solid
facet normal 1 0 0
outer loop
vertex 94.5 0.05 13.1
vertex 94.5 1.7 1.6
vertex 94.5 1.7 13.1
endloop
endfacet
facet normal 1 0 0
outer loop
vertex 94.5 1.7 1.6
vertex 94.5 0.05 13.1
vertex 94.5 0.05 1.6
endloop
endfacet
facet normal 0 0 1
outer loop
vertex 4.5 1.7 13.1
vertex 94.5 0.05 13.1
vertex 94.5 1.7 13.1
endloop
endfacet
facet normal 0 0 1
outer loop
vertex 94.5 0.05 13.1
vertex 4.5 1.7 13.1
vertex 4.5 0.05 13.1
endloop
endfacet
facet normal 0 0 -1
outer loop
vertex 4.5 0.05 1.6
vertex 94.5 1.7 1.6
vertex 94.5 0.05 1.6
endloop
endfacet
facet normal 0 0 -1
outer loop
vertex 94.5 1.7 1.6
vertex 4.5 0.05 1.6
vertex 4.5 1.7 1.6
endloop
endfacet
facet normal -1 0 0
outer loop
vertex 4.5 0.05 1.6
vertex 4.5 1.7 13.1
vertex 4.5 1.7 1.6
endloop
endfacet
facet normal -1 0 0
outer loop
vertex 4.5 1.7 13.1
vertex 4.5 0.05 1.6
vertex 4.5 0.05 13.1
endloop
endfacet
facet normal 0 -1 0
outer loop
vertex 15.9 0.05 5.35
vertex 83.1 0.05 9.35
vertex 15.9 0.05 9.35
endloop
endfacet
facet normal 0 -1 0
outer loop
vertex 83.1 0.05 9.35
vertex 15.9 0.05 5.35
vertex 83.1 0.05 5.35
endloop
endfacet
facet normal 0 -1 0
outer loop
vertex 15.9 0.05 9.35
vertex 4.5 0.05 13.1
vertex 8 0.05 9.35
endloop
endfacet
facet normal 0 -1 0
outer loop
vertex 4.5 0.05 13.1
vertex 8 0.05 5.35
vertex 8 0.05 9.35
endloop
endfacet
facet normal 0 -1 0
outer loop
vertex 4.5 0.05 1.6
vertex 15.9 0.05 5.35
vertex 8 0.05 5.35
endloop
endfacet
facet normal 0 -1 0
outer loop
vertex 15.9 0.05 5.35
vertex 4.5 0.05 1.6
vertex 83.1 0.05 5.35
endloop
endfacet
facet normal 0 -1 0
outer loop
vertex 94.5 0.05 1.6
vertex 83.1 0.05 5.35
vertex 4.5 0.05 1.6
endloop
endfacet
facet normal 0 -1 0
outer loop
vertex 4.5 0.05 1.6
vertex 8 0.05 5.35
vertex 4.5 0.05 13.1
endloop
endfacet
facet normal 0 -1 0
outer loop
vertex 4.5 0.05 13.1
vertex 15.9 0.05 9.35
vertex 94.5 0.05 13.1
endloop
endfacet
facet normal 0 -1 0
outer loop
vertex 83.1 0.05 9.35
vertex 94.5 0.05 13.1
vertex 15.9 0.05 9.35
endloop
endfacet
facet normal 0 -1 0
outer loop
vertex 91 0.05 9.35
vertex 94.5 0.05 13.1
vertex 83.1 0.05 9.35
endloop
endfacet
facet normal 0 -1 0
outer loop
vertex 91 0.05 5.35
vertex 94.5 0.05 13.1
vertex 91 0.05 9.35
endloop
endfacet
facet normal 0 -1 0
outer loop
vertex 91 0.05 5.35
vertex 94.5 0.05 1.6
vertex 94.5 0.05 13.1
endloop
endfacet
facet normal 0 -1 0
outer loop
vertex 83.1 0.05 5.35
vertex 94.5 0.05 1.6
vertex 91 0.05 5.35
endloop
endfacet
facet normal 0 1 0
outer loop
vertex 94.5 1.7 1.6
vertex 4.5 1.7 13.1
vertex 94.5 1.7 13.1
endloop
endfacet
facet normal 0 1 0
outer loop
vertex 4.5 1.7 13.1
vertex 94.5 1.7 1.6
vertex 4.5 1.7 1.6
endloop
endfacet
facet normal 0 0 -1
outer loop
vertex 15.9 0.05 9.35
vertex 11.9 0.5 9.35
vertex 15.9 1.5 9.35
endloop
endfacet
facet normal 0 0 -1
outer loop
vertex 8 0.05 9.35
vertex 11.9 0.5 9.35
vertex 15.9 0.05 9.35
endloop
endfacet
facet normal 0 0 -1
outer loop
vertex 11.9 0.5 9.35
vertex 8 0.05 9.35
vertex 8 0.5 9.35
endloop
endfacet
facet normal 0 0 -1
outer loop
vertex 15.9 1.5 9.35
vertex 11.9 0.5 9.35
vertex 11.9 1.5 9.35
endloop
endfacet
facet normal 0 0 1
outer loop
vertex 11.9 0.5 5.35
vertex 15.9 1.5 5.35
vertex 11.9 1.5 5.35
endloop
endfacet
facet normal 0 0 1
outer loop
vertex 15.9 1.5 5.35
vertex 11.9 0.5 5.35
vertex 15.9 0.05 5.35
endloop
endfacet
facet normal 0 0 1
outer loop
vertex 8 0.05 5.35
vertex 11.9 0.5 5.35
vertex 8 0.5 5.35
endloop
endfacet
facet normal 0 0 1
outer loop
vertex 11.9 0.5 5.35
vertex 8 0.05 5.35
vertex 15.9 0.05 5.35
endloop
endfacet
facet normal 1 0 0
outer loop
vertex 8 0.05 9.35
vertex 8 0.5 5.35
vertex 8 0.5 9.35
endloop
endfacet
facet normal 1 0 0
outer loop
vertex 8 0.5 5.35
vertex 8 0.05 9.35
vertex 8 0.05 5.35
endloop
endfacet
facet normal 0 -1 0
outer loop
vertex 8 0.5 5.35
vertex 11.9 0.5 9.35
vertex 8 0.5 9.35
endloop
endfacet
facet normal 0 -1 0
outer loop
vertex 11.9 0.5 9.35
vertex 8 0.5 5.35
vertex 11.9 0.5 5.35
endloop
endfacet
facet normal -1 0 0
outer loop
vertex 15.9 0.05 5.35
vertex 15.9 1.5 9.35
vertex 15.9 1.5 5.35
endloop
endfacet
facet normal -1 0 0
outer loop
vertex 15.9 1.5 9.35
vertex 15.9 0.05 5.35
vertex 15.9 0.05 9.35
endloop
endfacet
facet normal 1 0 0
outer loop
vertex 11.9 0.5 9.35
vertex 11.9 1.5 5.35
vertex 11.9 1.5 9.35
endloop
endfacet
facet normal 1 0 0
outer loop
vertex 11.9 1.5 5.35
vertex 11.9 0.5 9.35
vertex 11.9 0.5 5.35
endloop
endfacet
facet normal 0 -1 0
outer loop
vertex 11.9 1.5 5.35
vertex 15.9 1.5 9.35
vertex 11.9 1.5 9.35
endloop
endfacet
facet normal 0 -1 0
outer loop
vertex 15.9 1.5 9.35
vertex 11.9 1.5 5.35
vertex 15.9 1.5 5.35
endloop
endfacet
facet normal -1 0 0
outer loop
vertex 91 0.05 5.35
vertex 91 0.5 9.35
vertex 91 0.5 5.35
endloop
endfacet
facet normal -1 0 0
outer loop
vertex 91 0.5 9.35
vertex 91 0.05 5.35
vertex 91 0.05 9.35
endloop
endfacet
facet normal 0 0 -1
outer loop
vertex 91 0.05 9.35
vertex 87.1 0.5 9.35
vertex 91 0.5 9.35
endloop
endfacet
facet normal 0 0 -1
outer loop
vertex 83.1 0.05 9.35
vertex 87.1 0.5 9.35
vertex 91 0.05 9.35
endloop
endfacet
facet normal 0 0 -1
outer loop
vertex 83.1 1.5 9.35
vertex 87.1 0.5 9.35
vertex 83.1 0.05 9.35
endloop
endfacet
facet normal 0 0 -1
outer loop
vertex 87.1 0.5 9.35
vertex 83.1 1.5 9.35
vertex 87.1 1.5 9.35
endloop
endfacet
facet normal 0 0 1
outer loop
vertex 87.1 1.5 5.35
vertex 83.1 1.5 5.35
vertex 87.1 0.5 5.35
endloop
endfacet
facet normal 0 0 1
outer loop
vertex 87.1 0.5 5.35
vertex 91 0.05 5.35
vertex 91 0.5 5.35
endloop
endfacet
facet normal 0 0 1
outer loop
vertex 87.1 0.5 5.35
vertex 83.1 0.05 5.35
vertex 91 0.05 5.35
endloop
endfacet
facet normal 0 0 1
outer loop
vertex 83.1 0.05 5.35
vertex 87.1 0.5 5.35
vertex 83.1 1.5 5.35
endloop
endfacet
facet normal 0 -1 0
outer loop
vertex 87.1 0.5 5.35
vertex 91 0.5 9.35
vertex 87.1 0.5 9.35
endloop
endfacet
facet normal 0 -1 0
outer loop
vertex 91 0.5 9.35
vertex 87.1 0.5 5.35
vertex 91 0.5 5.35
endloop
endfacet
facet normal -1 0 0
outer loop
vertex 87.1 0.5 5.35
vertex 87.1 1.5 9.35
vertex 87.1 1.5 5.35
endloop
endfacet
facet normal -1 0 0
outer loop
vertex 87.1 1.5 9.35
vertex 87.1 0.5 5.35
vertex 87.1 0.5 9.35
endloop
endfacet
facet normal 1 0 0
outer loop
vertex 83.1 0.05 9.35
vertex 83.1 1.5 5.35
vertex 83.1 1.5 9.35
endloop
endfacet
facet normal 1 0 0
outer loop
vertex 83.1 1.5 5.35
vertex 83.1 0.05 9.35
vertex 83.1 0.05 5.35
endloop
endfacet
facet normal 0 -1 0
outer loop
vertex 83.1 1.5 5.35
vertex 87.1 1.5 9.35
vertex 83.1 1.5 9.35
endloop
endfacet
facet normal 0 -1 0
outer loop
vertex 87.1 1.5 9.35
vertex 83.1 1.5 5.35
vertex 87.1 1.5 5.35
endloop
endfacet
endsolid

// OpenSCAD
////// MixTape 3d Printed Case///////////////////////////

// 

plugHeight = 10.6; // [6:10]
tapeHeight = 11.5; //
topThickness = 1.6; 

bottom_wall_thickness = 2;

usb_charger = false;
cutout_aux_ports = false;

//rotate([55,0,$t*380]) translate([-50,0,0]){
rotate([0,0,0]) translate([0,0,0]){
//PCB();
//parts();

difference(){
    
    union(){
        tapeBody();
        //tapeTop();
    }
    
    // Plugs 
    translate([2.5,50,tapeHeight-plugHeight+topThickness]) cube([13,20,plugHeight+1],false); 
    translate([83.5,50,tapeHeight-plugHeight+topThickness]) cube([13,20,plugHeight+1],false);
    
    // write protectors 
    translate([10,0,0.5*tapeHeight+1.6]) cube([4,1,4],true);
    translate([13.9,0,0.5*tapeHeight+1.6]) cube([4,3,4],true);
    translate([89,0,0.5*tapeHeight+1.6]) cube([4,1,4],true);
    translate([85.1,0,0.5*tapeHeight+1.6]) cube([4,3,4],true);

    // Power signs
    //if (!usb_charger) {
    //    translate([41,0,0.5*tapeHeight+1.6]) cube([4,1.5,1],true);
    //    translate([41,0,0.5*tapeHeight+1.6]) cube([1,1.5,4],true);
    
    //    translate([58,0,0.5*tapeHeight+1.6]) cube([4,1.5,1],true); 
    //}
}
}

module FullCase(){
    tapeBody();
    tapeTop();
}


// Modules ///////////////////////////////

module PCB(){
color("DarkKhaki") 
translate ([0,0,tapeHeight+1.6]) linear_extrude(height = 1.6, center = false, convexity = 10, twist = 0) import("mixtape_case_3D_bottom.dxf", convexity=3);
color("Gold") 
translate ([0,0,tapeHeight+3.2]) linear_extrude(height = 0.2, center = false, convexity = 10, twist = 0) import("mixtape_case_3D_PCB.dxf", convexity=3);

color("DarkKhaki") 
translate ([0,0,tapeHeight+2*topThickness]) linear_extrude(height = 1.6, center = false, convexity = 10, twist = 0) import("mixtape_case_3D_PCB_TrapezBoard.dxf", convexity=3);
color("Gold") 
translate ([0,0,tapeHeight+3*topThickness]) linear_extrude(height = 0.2, center = false, convexity = 10, twist = 0) import("mixtape_case_3D_PCB_TrapezCircuit.dxf", convexity=3);
}

module tapeBody(){ 
    difference(){
        union(){
            difference(){ 
                //color("Deeppink") 
                translate ([0,0,1.6]) linear_extrude(height = tapeHeight, center = false, convexity = 10, twist = 0) import("mixtape_case_3D_bottom.dxf", convexity=3);  

                //if (!usb_charger) {
                    //translate ([0,0,0.6]) linear_extrude(height = tapeHeight+4, center = false, convexity = 10, twist = 0) import("mixtape_case_3D_MainCase.dxf", convexity=3);
                //} else {
                    //translate ([0,0,0.6]) linear_extrude(height = tapeHeight+4, center = false, convexity = 10, twist = 0) import("mixtape_case_3D_MainCase_USB.dxf", convexity=3);
                //}
      
                //Face holes
                translate([25,64,0.5*tapeHeight+topThickness]) cube([12,2,0.7*tapeHeight],true);
                if (!usb_charger) { 
                    translate([49.5,64,0.5*tapeHeight+topThickness]) cube([16,2,0.7*tapeHeight],true); 
                }
                translate([74.3,64,0.5*tapeHeight+topThickness]) cube([12,2,0.7*tapeHeight],true);

                translate([36,65,0.5*tapeHeight+topThickness]) cube([4,2,0.7*tapeHeight],true);
                translate([63,65,0.5*tapeHeight+topThickness]) cube([4,2,0.7*tapeHeight],true);

                if (usb_charger) {
                    // cutout usb port
                    translate([49.5,64,0.5*tapeHeight+topThickness+3])cube([20,14,0.7*tapeHeight+4],true);
                }


                if (cutout_aux_ports) {
                    translate([1.5,23,0.5*tapeHeight+topThickness+3]) cube([20,12,tapeHeight],true);
                    translate([90,23,0.5*tapeHeight+topThickness+3]) cube([20,12,tapeHeight],true);      
                }
            }
            translate([49.5,7.05,0.5*tapeHeight+topThickness]) cube([90,14,1*tapeHeight],true);
        } //end union
        
        
    // wall thickness
        translate([49.5,22.5+bottom_wall_thickness,0.5*tapeHeight+topThickness-1]) cube([93,45.6,1*tapeHeight+7],true);
        translate([49.5,40+bottom_wall_thickness+2.8,0.5*tapeHeight+topThickness-1]) cube([65,35,0.7*tapeHeight+7],true);
    } // end difference
    //color("DarkKhaki") 
    if (!usb_charger) {
    //translate([40,0.05,1.6]) cube([20,10,2.5],false);
    }
}

module tapeTop(){ 
 
difference(){ 
 color("Deeppink") 
     translate ([0,0,-1.5]) linear_extrude(height = 1.5, center = false, convexity = 10, twist = 0) import("mixtape_case_3D_TopTrapez.dxf", convexity=3);
     
   color("Gold") 
     translate ([0,0,-2.2]) linear_extrude(height = 3, center = false, convexity = 10, twist = 0) import("mixtape_case_3D_Holes.dxf", convexity=3);
   translate([50,53,-2.2]) cylinder(h=1.2, r=1.3, center=false, ,$fn=30);
}   
    

difference(){    
  color("Deeppink") 
     translate ([0,0,0]) linear_extrude(height = 1.6, center = false, convexity = 10, twist = 0) import("mixtape_case_3D_bottom.dxf", convexity=3);

  translate([4,3,-1]) cylinder(h=1.5, r=1.3, center=false, ,$fn=30);
  translate([95,3,-1]) cylinder(h=1.5, r=1.3, center=false, ,$fn=30);
  translate([4,61,-1]) cylinder(h=1.5, r=1.3, center=false, ,$fn=30);
  translate([95,61,-1]) cylinder(h=1.5, r=1.3, center=false, ,$fn=30);
    
  color("Pink") 
     translate ([0,0,-1.3]) linear_extrude(height = 2, center = false, convexity = 10, twist = 0) import("mixtape_case_3D_WindowRect.dxf", convexity=3); 
    
  difference(){    
  color("Gold") 
     translate ([0,0,-0.5]) linear_extrude(height = 1, center = false, convexity = 10, twist = 0) import("mixtape_case_3D_BigRect.dxf", convexity=3);  
  

  translate ([0,0,-3]) linear_extrude(height = 10, center = false, convexity = 10, twist = 0) import("mixtape_case_3D_MidRect.dxf", convexity=3);   
  }
  
  translate ([0,0,-3]) linear_extrude(height = 5.5, center = false, convexity = 10, twist = 0) import("mixtape_case_3D_Wheels.dxf", convexity=3); 
}

  translate ([0,0,0.4]) linear_extrude(height = 1.2, center = false, convexity = 10, twist = 0) import("mixtape_case_3D_NutWheels.dxf", convexity=3); 

}
 

module parts(){
    // IC-Socket
  color("Grey")
      translate([44,22.5,tapeHeight+2*topThickness]) cube([11,13,4],false);
    
  difference(){
  color("Black")
      translate([45,23.5,tapeHeight+2*topThickness]) cube([9,11,7],false);
        
    translate([49.5,34.5,tapeHeight+2*topThickness+6]) cylinder(h=10, r=1.5, center=false, ,$fn=30);
    }
    
    // NEO-Pixels
    for (a = [ 0 : 6.3 : 46 ])
    translate([a,0,0]) NEOpixel();
    
    module NEOpixel(){
    color("White")
      translate([25.2,52.5,tapeHeight+3*topThickness]) cube([5,5,2],false);
        
    color("Deeppink")
      translate([27.7,55,tapeHeight+3*topThickness]) cylinder(h=2.5, r=2, center=false, ,$fn=30);
    }
    
    // Pots
    potentiometer();
    translate ([42,0,0]) potentiometer();
    
    module potentiometer(){
    color("Grey")
      translate([29,29,tapeHeight+2*topThickness]) cylinder(h=10, r=3.5, center=false, ,$fn=30);
    
    color("Deeppink")
        translate([29,29,tapeHeight+2*topThickness+2]) cylinder(h=12, r1=6, r2=4.5, center=false, ,$fn=30);
    }
    
    // Buttons
    button();
    translate ([58,0,0]) button();
    
    module button(){
    color("Grey")
      translate([17.5,9.8,tapeHeight+2*topThickness]) cube([6,6,3],false);
        
    color("Red")
      translate([20.5,12.8,tapeHeight+2*topThickness]) cylinder(h=5, r=1.5, center=false, ,$fn=30);
    }

}
